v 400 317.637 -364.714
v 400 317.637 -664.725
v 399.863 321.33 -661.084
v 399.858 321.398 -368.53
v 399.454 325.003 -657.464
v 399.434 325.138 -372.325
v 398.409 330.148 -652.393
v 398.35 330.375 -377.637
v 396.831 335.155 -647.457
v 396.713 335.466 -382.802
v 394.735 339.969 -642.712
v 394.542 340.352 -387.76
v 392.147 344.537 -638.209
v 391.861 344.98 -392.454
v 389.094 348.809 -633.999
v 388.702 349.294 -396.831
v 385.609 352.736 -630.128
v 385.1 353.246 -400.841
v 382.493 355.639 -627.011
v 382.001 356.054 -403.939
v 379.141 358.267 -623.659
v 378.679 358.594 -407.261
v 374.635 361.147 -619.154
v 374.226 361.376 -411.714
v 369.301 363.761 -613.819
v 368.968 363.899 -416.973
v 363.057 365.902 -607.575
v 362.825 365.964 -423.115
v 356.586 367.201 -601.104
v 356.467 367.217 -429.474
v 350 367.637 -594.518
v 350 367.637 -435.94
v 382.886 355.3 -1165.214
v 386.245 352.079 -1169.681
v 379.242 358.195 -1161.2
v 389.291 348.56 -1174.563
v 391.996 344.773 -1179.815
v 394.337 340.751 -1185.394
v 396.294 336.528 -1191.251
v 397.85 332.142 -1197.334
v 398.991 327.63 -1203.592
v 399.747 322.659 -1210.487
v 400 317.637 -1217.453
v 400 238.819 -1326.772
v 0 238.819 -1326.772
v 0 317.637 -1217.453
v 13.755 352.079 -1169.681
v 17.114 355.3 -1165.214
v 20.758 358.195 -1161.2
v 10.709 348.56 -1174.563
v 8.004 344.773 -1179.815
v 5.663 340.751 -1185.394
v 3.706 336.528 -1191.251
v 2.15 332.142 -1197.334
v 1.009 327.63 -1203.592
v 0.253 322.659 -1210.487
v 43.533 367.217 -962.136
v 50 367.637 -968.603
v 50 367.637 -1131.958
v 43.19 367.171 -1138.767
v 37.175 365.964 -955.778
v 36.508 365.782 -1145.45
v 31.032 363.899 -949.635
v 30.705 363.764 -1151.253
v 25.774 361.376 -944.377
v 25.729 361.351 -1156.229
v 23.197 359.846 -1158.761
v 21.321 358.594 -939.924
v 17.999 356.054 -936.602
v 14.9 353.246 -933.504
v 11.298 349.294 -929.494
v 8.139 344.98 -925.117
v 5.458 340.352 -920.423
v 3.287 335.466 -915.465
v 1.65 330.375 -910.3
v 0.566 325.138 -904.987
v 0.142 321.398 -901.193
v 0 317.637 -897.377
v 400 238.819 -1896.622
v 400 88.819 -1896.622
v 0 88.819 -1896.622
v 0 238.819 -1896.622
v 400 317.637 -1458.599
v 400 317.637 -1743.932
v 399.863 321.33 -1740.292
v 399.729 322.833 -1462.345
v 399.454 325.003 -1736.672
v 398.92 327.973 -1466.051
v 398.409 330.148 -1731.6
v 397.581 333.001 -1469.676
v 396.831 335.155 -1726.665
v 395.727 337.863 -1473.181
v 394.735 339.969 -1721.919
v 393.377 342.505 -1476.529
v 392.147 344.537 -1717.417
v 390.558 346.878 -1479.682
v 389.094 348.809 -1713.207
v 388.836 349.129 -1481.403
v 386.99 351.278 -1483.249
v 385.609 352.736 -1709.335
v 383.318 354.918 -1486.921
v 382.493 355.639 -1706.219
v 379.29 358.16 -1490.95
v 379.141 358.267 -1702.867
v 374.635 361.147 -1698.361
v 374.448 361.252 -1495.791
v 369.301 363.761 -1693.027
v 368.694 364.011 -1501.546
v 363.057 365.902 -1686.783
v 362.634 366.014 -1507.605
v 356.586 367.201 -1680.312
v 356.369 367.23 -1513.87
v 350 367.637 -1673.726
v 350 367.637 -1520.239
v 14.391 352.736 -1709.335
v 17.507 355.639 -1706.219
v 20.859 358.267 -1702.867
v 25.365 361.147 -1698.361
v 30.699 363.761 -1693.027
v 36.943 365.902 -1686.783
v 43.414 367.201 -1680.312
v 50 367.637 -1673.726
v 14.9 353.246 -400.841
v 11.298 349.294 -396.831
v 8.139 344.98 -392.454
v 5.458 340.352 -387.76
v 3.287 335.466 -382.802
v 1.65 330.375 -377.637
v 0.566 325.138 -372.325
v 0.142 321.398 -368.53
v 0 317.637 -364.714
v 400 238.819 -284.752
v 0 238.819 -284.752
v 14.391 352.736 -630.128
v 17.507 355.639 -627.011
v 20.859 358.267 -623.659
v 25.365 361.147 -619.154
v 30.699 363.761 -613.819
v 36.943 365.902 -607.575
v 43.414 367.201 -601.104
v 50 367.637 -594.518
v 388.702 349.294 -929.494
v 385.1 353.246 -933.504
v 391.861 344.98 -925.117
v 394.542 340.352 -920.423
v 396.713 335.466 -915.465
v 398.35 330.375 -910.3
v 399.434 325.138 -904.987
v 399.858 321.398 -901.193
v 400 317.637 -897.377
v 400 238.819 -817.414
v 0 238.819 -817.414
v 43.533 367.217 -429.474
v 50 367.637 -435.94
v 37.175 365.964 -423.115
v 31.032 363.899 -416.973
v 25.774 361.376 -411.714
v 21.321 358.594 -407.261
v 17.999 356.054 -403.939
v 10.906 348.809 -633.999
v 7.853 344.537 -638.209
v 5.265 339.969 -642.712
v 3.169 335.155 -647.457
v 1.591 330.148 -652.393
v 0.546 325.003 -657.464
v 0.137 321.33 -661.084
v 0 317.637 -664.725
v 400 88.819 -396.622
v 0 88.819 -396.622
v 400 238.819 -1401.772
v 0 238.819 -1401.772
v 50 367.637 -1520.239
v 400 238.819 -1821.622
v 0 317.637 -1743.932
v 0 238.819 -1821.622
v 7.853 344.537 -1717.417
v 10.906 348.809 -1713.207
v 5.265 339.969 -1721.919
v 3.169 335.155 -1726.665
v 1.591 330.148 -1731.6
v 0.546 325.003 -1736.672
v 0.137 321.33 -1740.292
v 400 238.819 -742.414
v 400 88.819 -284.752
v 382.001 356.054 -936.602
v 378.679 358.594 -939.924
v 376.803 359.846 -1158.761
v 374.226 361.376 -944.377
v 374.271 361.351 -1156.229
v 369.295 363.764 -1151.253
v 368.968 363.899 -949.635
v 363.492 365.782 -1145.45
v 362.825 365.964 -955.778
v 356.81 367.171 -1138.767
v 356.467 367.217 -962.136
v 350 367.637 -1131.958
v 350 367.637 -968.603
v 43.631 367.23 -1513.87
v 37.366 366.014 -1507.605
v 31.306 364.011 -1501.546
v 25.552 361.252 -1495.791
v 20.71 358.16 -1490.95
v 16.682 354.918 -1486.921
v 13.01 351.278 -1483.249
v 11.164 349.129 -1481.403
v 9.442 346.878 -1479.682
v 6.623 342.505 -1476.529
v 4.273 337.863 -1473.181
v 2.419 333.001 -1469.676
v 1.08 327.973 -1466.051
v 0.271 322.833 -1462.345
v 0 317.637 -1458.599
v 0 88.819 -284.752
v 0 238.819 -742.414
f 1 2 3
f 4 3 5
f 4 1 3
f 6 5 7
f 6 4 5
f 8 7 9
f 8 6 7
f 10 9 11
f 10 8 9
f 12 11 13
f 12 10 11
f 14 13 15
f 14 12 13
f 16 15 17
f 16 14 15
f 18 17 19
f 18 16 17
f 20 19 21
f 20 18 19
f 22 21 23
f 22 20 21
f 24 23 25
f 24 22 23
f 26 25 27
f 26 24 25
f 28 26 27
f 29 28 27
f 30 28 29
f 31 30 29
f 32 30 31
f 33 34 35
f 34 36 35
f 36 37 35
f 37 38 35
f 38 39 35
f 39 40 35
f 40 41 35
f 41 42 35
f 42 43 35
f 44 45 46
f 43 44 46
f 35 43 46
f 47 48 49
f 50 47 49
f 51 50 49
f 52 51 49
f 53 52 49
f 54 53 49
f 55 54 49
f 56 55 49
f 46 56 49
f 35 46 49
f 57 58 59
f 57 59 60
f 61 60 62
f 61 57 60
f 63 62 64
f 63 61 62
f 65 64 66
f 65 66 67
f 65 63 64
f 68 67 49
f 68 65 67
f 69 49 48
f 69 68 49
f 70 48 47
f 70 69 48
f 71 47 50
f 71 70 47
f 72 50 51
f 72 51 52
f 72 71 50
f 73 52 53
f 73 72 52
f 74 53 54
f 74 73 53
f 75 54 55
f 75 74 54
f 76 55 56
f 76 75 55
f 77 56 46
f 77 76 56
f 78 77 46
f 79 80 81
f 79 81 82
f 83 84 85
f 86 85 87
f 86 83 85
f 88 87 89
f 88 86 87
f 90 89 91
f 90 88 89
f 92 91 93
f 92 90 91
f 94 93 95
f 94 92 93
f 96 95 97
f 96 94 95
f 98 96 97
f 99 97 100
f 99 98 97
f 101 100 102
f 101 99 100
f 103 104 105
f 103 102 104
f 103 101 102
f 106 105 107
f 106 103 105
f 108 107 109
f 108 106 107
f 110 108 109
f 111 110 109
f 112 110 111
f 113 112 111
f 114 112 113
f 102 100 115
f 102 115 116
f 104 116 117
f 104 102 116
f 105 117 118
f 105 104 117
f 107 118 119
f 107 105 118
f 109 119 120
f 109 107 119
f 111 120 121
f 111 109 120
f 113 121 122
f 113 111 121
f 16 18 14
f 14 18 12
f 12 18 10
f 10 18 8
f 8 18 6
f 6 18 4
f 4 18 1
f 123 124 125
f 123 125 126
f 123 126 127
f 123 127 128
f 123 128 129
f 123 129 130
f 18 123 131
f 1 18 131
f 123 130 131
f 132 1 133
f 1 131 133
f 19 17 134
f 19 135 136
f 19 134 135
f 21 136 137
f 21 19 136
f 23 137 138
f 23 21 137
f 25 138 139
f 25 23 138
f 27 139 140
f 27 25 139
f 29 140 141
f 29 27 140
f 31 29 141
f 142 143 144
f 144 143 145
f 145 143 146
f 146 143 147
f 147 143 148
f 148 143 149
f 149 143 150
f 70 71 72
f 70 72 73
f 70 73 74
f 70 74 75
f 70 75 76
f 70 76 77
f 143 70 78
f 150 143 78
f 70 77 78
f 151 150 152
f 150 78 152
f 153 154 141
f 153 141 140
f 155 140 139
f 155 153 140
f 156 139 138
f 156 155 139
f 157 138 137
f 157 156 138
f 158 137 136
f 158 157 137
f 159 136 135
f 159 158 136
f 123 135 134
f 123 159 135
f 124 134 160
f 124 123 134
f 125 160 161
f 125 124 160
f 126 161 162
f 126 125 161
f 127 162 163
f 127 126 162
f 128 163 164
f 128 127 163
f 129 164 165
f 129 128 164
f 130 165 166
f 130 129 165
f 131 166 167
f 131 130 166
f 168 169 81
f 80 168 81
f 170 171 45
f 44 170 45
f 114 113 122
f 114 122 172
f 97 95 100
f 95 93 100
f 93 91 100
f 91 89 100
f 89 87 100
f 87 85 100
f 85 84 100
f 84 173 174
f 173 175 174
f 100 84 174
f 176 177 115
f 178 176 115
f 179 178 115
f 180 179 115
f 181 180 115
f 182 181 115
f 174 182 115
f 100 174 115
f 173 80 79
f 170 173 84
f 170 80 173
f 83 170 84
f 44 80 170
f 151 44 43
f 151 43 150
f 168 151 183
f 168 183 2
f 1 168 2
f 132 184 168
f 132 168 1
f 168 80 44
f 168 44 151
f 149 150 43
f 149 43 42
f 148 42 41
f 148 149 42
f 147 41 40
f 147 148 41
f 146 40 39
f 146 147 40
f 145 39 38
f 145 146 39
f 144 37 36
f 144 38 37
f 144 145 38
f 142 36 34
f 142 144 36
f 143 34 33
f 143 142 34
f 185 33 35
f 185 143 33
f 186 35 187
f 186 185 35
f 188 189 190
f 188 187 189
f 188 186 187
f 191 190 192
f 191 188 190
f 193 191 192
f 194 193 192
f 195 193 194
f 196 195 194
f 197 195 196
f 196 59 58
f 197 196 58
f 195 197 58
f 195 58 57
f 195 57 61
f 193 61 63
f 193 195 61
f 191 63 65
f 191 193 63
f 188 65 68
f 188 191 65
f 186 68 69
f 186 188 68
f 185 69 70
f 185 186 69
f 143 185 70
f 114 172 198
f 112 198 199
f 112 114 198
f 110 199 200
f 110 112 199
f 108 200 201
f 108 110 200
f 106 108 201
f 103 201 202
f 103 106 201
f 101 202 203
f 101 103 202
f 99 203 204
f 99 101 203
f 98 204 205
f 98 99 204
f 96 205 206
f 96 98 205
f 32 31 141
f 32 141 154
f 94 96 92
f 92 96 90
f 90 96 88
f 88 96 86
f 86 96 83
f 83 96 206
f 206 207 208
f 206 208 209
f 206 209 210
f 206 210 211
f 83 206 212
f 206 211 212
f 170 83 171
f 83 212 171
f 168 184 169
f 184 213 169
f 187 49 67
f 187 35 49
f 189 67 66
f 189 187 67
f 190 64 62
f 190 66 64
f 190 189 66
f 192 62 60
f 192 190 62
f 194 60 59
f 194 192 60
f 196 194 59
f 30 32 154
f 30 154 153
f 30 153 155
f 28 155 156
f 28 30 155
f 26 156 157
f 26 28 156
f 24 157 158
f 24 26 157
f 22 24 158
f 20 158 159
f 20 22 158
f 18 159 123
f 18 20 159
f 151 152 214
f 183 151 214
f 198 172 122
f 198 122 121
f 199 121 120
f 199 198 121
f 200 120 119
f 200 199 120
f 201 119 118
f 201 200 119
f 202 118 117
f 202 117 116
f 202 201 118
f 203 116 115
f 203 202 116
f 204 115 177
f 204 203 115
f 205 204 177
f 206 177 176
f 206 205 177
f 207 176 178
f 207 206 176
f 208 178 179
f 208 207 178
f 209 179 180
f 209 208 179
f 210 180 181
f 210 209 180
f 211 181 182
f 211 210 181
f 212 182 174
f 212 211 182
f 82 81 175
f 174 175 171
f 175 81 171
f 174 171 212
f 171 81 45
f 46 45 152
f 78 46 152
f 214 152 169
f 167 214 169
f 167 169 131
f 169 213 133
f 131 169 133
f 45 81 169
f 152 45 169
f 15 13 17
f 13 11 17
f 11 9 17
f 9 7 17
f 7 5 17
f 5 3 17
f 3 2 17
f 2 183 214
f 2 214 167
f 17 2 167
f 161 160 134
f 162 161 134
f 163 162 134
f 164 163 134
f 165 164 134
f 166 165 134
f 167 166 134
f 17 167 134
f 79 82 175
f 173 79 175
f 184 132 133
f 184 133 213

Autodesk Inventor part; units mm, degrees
ref_plane "YZ Plane" through (0, 0, 0) normal (1, 0, 0) x (0, 1, 0)
ref_plane "XZ Plane" through (0, 0, 0) normal (0, 1, 0) x (-1, 0, 0)
ref_plane "XY Plane" through (0, 0, 0) normal (0, 0, 1) x (1, 0, 0)
sketch "Sketch4" plane through (0, 0, 0) normal (1, 0, 0) x (0, 1, 0)
  line L0 (88.8188, -396.6218) -> (88.8188, -1896.6218)
  line L1 (88.8188, -1896.6218) -> (238.8188, -1896.6218)
  line L2 (238.8188, -1896.6218) -> (238.8188, -1821.6218)
  line L3 (238.8188, -1821.6218) -> (367.6368, -1694.6481)
  line L4 (367.6368, -1694.6481) -> (367.6368, -1494.6481)
  line L5 (367.6368, -1494.6481) -> (238.8188, -1401.7722)
  line L6 (238.8188, -1401.7722) -> (238.8188, -1326.7722)
  line L7 (238.8188, -1326.7722) -> (367.6368, -1148.1032)
  line L8 (367.6368, -1148.1032) -> (367.6368, -948.1032)
  line L9 (367.6368, -948.1032) -> (238.8188, -817.4142)
  line L10 (238.8188, -817.4142) -> (238.8188, -742.4142)
  line L11 (238.8188, -742.4142) -> (367.6368, -615.4405)
  line L12 (367.6368, -615.4405) -> (367.6368, -415.4405)
  line L13 (367.6368, -415.4405) -> (238.8188, -284.7516)
  line L14 (238.8188, -284.7516) -> (88.8188, -284.7516)
  line L15 (88.8188, -284.7516) -> (88.8188, -396.6218)
  point P0 (0, 0)
  dimension "d47" = 1500
  dimension "d48" = 150
  dimension "d49" = 75
  dimension "d50" = 200
  dimension "d51" = 75
  dimension "d52" = 200
  dimension "d53" = 75
  dimension "d54" = 200
extrude "Extrusion4" add sketch "Sketch4" along normal blind 400
fillet "Fillet5" radius 50 12 edges at (200, 367.6368, -415.4405) (400, 367.6368, -515.4405) (200, 367.6368, -615.4405) (200, 367.6368, -948.1032) (0, 367.6368, -515.4405) (0, 367.6368, -1048.1032) (200, 367.6368, -1148.1032) (400, 367.6368, -1048.1032) (200, 367.6368, -1494.6481) (400, 367.6368, -1594.6481) (200, 367.6368, -1694.6481) (0, 367.6368, -1594.6481)
properties part number "mould"
